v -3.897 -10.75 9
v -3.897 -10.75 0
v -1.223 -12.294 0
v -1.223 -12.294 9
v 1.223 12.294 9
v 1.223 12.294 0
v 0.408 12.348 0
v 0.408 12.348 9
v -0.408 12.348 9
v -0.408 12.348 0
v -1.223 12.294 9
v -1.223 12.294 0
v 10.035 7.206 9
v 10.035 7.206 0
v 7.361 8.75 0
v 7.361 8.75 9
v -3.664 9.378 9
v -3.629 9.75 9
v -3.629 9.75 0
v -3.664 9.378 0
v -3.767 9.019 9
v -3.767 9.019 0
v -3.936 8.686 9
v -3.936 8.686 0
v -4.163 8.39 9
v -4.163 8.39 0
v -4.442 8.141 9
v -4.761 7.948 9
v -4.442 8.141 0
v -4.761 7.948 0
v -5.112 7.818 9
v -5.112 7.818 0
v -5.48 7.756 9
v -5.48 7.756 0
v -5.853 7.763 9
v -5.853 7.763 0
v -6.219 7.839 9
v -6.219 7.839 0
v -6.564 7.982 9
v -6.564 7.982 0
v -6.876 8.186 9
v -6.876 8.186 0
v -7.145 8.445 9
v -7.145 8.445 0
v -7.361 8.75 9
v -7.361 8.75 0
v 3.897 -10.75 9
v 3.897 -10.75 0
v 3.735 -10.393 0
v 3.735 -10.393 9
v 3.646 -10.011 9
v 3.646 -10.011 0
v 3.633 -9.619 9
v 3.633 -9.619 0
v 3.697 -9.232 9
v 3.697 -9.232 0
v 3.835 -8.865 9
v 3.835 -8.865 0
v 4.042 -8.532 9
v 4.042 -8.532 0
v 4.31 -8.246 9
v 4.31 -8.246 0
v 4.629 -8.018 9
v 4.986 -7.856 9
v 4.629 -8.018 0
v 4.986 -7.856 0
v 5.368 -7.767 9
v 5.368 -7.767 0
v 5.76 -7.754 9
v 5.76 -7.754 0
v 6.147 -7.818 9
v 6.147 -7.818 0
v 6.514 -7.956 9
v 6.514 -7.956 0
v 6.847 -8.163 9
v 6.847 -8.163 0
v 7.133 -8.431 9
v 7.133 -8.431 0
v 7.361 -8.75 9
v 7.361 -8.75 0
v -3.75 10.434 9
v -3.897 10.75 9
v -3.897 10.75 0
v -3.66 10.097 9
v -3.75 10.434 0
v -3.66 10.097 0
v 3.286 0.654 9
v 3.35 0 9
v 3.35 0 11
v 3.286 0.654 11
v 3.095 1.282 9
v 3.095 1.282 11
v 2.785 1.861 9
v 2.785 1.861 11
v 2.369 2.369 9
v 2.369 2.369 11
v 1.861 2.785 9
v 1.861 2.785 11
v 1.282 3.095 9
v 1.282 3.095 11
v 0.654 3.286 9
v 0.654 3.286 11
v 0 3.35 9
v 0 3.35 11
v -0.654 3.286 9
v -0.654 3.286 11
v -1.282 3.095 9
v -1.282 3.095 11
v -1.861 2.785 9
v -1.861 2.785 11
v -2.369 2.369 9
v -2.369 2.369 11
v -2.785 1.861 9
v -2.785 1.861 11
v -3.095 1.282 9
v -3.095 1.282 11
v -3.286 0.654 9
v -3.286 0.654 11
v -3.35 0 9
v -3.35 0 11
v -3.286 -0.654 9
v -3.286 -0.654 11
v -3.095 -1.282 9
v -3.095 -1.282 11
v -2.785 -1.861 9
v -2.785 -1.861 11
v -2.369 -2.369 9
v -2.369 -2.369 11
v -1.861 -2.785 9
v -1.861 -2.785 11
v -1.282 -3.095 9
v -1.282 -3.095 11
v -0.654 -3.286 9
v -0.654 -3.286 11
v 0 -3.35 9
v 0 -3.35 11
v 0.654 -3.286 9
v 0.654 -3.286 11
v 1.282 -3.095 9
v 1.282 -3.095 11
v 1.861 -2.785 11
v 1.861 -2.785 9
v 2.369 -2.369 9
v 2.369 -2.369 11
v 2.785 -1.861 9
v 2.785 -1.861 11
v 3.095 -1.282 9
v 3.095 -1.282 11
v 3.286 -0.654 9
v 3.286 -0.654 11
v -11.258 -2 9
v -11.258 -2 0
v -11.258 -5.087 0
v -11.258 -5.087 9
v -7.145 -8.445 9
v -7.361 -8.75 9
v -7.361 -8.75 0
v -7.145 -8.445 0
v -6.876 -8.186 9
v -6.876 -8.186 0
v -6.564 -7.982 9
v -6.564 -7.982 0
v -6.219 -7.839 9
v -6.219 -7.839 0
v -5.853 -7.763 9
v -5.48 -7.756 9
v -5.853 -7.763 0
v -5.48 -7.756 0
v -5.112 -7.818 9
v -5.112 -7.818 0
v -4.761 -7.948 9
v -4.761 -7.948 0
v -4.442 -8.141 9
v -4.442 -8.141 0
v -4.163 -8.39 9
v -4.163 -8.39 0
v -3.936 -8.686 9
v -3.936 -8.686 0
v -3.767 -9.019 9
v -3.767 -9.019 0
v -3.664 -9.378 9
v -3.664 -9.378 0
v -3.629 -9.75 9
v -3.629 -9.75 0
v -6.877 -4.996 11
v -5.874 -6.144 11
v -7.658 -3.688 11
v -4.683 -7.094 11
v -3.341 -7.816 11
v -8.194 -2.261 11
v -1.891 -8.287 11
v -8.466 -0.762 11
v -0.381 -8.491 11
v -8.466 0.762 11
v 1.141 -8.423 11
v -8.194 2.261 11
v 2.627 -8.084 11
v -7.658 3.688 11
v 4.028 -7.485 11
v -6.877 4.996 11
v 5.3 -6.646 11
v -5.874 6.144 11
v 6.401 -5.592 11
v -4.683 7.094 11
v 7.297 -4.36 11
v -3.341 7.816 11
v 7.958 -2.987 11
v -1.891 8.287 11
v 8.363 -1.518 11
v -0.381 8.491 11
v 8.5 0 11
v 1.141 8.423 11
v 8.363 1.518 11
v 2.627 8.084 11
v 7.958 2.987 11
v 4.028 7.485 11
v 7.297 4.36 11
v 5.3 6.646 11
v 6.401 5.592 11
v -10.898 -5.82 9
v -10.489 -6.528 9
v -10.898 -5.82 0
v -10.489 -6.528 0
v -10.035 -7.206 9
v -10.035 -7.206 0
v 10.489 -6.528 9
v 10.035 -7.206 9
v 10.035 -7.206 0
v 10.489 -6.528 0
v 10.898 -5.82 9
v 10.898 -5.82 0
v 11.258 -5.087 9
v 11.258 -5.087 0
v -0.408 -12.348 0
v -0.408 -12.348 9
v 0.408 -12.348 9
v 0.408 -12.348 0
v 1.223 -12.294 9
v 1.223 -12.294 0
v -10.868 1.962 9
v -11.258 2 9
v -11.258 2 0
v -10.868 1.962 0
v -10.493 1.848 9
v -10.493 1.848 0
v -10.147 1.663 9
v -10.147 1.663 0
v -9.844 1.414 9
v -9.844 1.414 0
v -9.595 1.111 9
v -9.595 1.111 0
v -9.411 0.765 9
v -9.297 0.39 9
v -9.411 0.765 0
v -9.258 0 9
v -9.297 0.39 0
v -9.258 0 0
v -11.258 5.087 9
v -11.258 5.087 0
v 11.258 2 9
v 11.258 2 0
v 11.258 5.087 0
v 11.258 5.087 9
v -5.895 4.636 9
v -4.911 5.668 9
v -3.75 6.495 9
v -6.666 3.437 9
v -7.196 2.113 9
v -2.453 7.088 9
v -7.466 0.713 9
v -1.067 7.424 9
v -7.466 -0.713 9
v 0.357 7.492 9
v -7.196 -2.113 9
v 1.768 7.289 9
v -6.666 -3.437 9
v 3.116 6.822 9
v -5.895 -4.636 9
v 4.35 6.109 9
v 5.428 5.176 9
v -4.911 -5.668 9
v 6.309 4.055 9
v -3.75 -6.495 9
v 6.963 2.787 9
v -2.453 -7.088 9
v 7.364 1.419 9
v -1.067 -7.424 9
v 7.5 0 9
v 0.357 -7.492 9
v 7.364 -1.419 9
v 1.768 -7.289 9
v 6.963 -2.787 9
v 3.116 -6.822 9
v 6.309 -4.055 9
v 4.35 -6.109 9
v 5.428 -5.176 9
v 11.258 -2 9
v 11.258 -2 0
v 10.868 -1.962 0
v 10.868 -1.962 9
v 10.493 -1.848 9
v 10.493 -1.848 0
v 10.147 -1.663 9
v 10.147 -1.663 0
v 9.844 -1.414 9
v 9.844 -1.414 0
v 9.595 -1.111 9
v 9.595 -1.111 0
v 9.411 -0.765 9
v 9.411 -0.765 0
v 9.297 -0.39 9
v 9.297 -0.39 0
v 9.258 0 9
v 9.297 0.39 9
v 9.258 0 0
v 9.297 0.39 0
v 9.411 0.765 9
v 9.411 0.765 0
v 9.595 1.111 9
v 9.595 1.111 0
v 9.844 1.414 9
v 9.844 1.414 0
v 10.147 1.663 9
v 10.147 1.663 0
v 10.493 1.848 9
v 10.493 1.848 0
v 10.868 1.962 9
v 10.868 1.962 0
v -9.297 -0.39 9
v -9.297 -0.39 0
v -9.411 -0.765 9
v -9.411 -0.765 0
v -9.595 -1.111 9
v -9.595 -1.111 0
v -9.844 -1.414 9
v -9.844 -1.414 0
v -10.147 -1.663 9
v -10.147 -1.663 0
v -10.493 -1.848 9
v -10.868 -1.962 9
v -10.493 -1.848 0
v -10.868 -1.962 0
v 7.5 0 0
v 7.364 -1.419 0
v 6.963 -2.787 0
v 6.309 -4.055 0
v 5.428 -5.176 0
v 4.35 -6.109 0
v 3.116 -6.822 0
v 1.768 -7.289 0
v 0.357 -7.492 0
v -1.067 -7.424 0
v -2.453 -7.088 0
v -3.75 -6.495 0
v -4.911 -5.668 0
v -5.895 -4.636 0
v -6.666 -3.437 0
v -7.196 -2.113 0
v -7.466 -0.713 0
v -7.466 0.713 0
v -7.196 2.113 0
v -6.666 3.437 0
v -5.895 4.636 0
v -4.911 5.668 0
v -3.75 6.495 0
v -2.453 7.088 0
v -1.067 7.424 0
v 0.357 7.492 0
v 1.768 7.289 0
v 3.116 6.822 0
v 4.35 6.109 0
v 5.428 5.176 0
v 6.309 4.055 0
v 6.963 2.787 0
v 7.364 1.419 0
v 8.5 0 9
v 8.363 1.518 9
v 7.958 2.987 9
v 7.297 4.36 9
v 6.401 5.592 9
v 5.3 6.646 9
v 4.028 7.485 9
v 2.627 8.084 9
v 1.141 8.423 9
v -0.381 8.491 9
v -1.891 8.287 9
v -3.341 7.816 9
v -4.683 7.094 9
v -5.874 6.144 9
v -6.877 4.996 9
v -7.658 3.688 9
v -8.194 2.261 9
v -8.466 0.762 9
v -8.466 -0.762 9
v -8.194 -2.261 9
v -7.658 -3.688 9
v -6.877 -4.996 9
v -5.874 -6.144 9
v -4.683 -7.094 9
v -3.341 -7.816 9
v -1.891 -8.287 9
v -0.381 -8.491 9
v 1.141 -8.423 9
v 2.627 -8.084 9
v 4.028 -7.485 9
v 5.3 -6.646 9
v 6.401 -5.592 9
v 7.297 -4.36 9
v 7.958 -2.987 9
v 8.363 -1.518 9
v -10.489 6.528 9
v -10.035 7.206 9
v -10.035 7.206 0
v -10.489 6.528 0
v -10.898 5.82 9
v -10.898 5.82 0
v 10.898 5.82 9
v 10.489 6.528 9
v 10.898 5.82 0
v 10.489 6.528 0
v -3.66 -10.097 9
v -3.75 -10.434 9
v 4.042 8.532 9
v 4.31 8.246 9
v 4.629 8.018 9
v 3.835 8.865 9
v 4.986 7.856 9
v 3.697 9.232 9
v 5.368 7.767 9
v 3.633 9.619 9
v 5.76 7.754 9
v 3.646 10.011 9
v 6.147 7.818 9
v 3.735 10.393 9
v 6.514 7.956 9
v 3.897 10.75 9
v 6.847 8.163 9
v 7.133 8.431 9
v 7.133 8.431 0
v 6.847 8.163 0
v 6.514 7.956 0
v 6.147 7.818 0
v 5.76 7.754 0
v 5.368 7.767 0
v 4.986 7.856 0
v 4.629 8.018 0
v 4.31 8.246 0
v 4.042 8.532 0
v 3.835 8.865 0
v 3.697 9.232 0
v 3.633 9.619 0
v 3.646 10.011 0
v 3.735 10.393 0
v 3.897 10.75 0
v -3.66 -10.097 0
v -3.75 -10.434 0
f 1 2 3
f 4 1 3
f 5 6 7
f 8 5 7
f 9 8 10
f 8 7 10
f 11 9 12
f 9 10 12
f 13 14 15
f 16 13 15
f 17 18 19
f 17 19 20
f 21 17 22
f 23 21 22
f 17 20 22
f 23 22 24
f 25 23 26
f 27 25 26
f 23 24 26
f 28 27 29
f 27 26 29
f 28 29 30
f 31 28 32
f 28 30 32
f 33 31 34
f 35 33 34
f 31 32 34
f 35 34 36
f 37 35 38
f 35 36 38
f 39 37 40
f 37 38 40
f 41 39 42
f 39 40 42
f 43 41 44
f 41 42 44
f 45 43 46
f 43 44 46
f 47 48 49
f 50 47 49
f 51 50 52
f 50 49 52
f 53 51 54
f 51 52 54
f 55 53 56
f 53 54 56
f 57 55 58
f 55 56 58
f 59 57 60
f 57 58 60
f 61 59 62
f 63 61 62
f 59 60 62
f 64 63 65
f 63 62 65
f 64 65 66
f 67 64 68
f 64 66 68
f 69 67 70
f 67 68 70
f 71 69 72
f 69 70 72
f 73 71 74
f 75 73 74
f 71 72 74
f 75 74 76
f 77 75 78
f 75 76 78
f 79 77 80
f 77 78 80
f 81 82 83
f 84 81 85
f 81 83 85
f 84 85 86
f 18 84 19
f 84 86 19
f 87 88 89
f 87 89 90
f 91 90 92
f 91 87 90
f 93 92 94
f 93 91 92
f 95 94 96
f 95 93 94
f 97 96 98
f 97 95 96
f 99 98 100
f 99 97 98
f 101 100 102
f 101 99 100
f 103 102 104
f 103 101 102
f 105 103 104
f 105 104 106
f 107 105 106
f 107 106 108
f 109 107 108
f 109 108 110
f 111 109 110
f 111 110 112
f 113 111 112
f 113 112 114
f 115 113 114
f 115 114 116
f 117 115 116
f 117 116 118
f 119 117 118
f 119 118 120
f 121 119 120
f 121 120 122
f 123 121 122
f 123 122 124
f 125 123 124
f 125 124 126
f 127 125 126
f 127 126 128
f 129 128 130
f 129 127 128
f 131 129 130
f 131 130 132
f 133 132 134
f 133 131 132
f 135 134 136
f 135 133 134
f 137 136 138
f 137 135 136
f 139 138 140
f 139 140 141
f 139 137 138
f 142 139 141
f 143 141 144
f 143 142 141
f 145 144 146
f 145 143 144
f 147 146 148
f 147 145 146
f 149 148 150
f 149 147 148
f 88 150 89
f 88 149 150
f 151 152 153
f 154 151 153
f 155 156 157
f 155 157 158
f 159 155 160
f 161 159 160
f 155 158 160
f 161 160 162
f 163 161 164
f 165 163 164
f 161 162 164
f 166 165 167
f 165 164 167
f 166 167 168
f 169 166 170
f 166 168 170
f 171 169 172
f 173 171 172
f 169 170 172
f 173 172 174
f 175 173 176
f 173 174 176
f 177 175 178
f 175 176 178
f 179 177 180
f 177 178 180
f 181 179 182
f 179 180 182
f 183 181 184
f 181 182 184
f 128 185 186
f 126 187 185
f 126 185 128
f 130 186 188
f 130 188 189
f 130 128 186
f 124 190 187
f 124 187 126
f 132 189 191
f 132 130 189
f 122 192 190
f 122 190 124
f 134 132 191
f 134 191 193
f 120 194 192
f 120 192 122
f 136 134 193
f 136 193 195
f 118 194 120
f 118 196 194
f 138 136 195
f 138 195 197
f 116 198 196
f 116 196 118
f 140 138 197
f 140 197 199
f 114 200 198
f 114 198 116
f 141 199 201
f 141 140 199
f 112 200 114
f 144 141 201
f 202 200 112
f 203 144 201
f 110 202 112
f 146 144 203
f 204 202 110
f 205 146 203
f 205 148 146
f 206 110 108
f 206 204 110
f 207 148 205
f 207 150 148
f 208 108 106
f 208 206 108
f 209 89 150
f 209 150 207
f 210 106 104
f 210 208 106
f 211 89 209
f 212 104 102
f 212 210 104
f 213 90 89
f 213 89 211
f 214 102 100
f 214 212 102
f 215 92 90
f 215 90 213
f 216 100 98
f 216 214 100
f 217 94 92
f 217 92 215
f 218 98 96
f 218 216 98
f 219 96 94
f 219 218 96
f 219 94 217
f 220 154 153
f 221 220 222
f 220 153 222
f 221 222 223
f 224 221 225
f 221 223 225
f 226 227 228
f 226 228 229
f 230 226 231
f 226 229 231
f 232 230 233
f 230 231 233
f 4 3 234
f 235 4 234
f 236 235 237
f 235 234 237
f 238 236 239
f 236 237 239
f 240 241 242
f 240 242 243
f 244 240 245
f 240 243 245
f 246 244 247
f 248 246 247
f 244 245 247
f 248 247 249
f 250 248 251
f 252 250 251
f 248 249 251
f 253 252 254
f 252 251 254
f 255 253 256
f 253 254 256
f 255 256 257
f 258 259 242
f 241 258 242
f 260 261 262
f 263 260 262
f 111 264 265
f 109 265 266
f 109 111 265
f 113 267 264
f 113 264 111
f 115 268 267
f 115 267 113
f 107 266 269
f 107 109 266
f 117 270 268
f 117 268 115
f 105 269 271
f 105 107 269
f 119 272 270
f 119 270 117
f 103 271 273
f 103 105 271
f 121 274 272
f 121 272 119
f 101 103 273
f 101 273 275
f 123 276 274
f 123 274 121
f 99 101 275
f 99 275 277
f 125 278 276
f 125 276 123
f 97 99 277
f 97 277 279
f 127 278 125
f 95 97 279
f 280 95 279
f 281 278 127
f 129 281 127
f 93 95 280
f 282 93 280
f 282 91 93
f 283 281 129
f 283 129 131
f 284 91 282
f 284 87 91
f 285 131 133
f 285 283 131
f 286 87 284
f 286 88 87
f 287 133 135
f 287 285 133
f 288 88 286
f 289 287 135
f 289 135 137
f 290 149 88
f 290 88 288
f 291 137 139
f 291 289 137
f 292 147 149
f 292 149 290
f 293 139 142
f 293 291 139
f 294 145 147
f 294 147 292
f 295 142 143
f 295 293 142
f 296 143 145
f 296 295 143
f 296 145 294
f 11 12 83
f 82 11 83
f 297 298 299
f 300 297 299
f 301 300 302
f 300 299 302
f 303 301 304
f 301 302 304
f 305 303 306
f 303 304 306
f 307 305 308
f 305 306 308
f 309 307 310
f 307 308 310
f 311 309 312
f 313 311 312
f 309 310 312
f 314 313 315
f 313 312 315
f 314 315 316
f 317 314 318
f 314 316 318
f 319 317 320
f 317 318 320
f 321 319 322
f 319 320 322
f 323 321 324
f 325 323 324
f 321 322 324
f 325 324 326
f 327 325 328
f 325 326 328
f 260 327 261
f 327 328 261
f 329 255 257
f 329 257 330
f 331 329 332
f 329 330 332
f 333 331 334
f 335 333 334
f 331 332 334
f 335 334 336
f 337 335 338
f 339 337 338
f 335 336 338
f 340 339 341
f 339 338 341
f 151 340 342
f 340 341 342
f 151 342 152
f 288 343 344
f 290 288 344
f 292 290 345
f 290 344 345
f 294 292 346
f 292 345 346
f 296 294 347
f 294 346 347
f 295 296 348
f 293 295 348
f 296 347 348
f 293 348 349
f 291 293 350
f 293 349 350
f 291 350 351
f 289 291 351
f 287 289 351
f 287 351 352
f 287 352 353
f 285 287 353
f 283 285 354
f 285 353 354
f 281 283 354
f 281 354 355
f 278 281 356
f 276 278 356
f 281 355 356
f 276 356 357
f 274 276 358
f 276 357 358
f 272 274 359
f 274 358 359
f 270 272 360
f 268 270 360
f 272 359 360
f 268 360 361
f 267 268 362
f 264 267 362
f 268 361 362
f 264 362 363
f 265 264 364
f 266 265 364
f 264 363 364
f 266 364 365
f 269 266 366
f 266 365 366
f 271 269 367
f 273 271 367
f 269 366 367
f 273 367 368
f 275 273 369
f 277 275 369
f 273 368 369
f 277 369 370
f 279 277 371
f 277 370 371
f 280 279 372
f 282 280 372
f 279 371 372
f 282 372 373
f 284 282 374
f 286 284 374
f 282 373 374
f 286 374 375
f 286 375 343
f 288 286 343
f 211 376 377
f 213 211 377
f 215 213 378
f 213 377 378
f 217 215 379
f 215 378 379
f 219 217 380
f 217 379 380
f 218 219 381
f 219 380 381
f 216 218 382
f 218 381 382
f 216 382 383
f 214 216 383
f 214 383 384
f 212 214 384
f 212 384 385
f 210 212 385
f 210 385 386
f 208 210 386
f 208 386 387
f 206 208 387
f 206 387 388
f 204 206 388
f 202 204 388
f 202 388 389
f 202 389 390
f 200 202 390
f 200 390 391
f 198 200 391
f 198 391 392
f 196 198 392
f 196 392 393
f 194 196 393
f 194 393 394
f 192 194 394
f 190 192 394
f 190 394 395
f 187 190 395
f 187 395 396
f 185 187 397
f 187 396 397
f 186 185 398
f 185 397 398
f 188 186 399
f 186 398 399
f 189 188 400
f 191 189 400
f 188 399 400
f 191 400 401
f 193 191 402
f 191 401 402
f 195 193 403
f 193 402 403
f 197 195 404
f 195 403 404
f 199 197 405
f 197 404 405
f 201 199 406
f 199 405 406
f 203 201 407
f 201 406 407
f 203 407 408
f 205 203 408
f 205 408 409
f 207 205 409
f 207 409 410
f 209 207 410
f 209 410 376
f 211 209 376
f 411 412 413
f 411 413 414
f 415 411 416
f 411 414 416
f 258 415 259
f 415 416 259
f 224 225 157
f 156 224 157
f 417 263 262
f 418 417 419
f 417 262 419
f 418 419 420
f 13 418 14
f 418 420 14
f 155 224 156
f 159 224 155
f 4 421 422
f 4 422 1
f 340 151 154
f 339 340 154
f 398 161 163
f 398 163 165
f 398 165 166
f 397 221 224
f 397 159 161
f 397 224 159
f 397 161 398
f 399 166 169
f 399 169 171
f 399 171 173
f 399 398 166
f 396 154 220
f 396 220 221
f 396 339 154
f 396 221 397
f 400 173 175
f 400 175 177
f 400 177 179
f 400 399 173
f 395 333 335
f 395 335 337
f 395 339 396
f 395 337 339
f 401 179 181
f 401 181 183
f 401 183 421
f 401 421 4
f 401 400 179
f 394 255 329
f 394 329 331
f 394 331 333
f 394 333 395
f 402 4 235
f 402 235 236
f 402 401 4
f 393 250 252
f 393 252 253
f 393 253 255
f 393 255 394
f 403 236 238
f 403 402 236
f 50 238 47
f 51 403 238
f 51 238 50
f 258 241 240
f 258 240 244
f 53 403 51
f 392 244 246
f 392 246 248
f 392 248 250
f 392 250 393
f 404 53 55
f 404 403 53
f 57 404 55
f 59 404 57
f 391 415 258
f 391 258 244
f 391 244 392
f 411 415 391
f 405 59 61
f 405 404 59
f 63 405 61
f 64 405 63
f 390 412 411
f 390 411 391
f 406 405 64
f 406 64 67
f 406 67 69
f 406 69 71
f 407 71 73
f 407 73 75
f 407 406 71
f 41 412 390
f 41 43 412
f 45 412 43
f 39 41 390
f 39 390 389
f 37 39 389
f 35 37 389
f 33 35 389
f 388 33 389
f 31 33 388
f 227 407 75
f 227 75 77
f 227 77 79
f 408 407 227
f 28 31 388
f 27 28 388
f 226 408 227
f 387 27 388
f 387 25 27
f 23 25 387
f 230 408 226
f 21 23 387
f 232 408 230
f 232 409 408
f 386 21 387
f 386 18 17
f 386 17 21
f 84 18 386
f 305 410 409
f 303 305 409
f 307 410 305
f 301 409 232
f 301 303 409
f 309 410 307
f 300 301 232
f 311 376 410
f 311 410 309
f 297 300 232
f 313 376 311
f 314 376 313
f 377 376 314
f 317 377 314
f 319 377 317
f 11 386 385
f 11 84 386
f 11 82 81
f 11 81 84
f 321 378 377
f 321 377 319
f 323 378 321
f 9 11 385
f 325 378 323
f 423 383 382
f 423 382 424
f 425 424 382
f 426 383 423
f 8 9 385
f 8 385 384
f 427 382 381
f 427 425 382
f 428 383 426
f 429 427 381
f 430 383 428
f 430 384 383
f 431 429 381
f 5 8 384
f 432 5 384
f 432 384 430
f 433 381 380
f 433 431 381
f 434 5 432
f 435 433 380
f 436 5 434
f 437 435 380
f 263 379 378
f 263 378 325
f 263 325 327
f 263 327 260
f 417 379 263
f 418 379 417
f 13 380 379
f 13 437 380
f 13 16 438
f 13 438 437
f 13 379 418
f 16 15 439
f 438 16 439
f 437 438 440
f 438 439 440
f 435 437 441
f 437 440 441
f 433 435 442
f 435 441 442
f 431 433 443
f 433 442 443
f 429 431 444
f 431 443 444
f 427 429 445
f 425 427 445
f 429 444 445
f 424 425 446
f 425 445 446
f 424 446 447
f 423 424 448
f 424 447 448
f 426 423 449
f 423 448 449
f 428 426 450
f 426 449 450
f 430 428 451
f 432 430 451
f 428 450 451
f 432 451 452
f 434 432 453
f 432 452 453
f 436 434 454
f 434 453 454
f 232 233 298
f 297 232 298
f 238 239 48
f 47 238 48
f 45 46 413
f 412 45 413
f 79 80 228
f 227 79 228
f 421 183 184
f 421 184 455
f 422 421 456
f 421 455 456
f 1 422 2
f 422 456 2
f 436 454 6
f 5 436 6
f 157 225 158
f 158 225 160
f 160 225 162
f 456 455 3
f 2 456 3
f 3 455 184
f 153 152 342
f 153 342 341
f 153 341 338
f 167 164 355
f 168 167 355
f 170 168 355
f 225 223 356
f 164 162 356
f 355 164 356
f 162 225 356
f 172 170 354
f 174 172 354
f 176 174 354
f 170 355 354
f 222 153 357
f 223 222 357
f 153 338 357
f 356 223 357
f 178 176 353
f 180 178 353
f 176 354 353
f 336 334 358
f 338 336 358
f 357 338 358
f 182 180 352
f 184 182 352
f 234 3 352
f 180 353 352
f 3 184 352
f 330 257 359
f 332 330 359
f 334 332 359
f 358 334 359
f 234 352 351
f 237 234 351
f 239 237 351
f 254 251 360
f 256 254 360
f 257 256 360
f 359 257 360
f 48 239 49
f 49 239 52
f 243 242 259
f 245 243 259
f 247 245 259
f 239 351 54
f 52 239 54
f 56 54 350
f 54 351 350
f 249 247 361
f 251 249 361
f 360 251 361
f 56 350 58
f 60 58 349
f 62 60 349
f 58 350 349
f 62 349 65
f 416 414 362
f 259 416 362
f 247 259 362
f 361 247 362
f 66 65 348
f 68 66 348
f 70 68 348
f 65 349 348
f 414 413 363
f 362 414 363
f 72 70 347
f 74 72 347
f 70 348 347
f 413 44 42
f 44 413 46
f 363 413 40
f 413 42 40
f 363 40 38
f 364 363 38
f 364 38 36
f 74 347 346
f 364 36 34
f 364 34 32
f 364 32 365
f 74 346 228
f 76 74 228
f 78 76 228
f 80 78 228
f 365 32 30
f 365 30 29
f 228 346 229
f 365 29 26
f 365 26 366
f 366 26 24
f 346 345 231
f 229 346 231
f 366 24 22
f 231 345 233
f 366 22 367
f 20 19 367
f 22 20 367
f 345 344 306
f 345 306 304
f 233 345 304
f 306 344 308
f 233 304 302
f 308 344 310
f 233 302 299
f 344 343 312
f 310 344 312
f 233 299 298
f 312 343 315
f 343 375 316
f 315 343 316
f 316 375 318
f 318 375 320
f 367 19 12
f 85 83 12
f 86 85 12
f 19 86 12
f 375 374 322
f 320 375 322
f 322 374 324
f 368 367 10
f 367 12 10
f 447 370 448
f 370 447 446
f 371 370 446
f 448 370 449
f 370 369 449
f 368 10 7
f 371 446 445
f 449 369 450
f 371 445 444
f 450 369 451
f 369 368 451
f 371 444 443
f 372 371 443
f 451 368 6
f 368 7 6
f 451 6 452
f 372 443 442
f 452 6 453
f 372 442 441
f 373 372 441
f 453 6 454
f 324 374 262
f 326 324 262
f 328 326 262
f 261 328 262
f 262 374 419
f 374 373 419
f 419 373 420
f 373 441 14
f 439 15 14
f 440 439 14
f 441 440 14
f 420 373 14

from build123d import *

# Parameters (mm, degrees)
F0_R     = 8.5
F1_DEPTH = 9
F0_R_2   = 3.35
F2_DEPTH = 11
F3_R     = 7.5
F3_R_2   = 3.35
F4_DEPTH = 9


with BuildPart() as f1:
    # F0 (on Top) → F1 (new body)
    with BuildSketch(Plane.XY):
        with BuildLine():
            Line((-11.25833, -2), (-11.25833, -5.087327))
            ThreePointArc((-11.25833, -5.087327), (-10.699214, -6.177194), (-10.03492, -7.206336))
            Line((-10.03492, -7.206336), (-7.361216, -8.75))
            ThreePointArc((-7.361216, -8.75), (-5.111527, -7.818148), (-3.629165, -9.75))
            ThreePointArc((-3.629165, -9.75), (-3.697313, -10.267638), (-3.897114, -10.75))
            Line((-3.897114, -10.75), (-1.22341, -12.293664))
            ThreePointArc((-1.22341, -12.293664), (0, -12.354388), (1.22341, -12.293664))
            Line((1.22341, -12.293664), (3.897114, -10.75))
            ThreePointArc((3.897114, -10.75), (4.629165, -8.017949), (7.361216, -8.75))
            Line((7.361216, -8.75), (10.03492, -7.206336))
            ThreePointArc((10.03492, -7.206336), (10.699214, -6.177194), (11.25833, -5.087327))
            Line((11.25833, -5.087327), (11.25833, -2))
            ThreePointArc((11.25833, -2), (9.25833, 0), (11.25833, 2))
            Line((11.25833, 2), (11.25833, 5.087327))
            ThreePointArc((11.25833, 5.087327), (10.699214, 6.177194), (10.03492, 7.206336))
            Line((10.03492, 7.206336), (7.361216, 8.75))
            ThreePointArc((7.361216, 8.75), (4.629165, 8.017949), (3.897114, 10.75))
            Line((3.897114, 10.75), (1.22341, 12.293664))
            ThreePointArc((1.22341, 12.293664), (0, 12.354388), (-1.22341, 12.293664))
            Line((-1.22341, 12.293664), (-3.897114, 10.75))
            ThreePointArc((-3.897114, 10.75), (-3.697313, 10.267638), (-3.629165, 9.75))
            ThreePointArc((-3.629165, 9.75), (-5.111527, 7.818148), (-7.361216, 8.75))
            Line((-7.361216, 8.75), (-10.03492, 7.206336))
            ThreePointArc((-10.03492, 7.206336), (-10.699214, 6.177194), (-11.25833, 5.087327))
            Line((-11.25833, 5.087327), (-11.25833, 2))
            ThreePointArc((-11.25833, 2), (-9.844117, 1.414214), (-9.25833, 0))
            ThreePointArc((-9.25833, 0), (-9.844117, -1.414214), (-11.25833, -2))
        make_face()
        Circle(F0_R, mode=Mode.SUBTRACT)
    extrude(amount=F1_DEPTH)

    # F0 (on Top) → F2 (join)
    with BuildSketch(Plane.XY):
        Circle(F0_R)
        Circle(F0_R_2, mode=Mode.SUBTRACT)
    extrude(amount=F2_DEPTH)

    # F3 (on face) → F4 (cut)
    with BuildSketch(Plane(origin=(0, 0, 0), x_dir=(1, 0, 0), z_dir=(0, 0, -1))):
        Circle(F3_R)
        Circle(F3_R_2, mode=Mode.SUBTRACT)
    extrude(amount=-F4_DEPTH, mode=Mode.SUBTRACT)


solid = f1.part
